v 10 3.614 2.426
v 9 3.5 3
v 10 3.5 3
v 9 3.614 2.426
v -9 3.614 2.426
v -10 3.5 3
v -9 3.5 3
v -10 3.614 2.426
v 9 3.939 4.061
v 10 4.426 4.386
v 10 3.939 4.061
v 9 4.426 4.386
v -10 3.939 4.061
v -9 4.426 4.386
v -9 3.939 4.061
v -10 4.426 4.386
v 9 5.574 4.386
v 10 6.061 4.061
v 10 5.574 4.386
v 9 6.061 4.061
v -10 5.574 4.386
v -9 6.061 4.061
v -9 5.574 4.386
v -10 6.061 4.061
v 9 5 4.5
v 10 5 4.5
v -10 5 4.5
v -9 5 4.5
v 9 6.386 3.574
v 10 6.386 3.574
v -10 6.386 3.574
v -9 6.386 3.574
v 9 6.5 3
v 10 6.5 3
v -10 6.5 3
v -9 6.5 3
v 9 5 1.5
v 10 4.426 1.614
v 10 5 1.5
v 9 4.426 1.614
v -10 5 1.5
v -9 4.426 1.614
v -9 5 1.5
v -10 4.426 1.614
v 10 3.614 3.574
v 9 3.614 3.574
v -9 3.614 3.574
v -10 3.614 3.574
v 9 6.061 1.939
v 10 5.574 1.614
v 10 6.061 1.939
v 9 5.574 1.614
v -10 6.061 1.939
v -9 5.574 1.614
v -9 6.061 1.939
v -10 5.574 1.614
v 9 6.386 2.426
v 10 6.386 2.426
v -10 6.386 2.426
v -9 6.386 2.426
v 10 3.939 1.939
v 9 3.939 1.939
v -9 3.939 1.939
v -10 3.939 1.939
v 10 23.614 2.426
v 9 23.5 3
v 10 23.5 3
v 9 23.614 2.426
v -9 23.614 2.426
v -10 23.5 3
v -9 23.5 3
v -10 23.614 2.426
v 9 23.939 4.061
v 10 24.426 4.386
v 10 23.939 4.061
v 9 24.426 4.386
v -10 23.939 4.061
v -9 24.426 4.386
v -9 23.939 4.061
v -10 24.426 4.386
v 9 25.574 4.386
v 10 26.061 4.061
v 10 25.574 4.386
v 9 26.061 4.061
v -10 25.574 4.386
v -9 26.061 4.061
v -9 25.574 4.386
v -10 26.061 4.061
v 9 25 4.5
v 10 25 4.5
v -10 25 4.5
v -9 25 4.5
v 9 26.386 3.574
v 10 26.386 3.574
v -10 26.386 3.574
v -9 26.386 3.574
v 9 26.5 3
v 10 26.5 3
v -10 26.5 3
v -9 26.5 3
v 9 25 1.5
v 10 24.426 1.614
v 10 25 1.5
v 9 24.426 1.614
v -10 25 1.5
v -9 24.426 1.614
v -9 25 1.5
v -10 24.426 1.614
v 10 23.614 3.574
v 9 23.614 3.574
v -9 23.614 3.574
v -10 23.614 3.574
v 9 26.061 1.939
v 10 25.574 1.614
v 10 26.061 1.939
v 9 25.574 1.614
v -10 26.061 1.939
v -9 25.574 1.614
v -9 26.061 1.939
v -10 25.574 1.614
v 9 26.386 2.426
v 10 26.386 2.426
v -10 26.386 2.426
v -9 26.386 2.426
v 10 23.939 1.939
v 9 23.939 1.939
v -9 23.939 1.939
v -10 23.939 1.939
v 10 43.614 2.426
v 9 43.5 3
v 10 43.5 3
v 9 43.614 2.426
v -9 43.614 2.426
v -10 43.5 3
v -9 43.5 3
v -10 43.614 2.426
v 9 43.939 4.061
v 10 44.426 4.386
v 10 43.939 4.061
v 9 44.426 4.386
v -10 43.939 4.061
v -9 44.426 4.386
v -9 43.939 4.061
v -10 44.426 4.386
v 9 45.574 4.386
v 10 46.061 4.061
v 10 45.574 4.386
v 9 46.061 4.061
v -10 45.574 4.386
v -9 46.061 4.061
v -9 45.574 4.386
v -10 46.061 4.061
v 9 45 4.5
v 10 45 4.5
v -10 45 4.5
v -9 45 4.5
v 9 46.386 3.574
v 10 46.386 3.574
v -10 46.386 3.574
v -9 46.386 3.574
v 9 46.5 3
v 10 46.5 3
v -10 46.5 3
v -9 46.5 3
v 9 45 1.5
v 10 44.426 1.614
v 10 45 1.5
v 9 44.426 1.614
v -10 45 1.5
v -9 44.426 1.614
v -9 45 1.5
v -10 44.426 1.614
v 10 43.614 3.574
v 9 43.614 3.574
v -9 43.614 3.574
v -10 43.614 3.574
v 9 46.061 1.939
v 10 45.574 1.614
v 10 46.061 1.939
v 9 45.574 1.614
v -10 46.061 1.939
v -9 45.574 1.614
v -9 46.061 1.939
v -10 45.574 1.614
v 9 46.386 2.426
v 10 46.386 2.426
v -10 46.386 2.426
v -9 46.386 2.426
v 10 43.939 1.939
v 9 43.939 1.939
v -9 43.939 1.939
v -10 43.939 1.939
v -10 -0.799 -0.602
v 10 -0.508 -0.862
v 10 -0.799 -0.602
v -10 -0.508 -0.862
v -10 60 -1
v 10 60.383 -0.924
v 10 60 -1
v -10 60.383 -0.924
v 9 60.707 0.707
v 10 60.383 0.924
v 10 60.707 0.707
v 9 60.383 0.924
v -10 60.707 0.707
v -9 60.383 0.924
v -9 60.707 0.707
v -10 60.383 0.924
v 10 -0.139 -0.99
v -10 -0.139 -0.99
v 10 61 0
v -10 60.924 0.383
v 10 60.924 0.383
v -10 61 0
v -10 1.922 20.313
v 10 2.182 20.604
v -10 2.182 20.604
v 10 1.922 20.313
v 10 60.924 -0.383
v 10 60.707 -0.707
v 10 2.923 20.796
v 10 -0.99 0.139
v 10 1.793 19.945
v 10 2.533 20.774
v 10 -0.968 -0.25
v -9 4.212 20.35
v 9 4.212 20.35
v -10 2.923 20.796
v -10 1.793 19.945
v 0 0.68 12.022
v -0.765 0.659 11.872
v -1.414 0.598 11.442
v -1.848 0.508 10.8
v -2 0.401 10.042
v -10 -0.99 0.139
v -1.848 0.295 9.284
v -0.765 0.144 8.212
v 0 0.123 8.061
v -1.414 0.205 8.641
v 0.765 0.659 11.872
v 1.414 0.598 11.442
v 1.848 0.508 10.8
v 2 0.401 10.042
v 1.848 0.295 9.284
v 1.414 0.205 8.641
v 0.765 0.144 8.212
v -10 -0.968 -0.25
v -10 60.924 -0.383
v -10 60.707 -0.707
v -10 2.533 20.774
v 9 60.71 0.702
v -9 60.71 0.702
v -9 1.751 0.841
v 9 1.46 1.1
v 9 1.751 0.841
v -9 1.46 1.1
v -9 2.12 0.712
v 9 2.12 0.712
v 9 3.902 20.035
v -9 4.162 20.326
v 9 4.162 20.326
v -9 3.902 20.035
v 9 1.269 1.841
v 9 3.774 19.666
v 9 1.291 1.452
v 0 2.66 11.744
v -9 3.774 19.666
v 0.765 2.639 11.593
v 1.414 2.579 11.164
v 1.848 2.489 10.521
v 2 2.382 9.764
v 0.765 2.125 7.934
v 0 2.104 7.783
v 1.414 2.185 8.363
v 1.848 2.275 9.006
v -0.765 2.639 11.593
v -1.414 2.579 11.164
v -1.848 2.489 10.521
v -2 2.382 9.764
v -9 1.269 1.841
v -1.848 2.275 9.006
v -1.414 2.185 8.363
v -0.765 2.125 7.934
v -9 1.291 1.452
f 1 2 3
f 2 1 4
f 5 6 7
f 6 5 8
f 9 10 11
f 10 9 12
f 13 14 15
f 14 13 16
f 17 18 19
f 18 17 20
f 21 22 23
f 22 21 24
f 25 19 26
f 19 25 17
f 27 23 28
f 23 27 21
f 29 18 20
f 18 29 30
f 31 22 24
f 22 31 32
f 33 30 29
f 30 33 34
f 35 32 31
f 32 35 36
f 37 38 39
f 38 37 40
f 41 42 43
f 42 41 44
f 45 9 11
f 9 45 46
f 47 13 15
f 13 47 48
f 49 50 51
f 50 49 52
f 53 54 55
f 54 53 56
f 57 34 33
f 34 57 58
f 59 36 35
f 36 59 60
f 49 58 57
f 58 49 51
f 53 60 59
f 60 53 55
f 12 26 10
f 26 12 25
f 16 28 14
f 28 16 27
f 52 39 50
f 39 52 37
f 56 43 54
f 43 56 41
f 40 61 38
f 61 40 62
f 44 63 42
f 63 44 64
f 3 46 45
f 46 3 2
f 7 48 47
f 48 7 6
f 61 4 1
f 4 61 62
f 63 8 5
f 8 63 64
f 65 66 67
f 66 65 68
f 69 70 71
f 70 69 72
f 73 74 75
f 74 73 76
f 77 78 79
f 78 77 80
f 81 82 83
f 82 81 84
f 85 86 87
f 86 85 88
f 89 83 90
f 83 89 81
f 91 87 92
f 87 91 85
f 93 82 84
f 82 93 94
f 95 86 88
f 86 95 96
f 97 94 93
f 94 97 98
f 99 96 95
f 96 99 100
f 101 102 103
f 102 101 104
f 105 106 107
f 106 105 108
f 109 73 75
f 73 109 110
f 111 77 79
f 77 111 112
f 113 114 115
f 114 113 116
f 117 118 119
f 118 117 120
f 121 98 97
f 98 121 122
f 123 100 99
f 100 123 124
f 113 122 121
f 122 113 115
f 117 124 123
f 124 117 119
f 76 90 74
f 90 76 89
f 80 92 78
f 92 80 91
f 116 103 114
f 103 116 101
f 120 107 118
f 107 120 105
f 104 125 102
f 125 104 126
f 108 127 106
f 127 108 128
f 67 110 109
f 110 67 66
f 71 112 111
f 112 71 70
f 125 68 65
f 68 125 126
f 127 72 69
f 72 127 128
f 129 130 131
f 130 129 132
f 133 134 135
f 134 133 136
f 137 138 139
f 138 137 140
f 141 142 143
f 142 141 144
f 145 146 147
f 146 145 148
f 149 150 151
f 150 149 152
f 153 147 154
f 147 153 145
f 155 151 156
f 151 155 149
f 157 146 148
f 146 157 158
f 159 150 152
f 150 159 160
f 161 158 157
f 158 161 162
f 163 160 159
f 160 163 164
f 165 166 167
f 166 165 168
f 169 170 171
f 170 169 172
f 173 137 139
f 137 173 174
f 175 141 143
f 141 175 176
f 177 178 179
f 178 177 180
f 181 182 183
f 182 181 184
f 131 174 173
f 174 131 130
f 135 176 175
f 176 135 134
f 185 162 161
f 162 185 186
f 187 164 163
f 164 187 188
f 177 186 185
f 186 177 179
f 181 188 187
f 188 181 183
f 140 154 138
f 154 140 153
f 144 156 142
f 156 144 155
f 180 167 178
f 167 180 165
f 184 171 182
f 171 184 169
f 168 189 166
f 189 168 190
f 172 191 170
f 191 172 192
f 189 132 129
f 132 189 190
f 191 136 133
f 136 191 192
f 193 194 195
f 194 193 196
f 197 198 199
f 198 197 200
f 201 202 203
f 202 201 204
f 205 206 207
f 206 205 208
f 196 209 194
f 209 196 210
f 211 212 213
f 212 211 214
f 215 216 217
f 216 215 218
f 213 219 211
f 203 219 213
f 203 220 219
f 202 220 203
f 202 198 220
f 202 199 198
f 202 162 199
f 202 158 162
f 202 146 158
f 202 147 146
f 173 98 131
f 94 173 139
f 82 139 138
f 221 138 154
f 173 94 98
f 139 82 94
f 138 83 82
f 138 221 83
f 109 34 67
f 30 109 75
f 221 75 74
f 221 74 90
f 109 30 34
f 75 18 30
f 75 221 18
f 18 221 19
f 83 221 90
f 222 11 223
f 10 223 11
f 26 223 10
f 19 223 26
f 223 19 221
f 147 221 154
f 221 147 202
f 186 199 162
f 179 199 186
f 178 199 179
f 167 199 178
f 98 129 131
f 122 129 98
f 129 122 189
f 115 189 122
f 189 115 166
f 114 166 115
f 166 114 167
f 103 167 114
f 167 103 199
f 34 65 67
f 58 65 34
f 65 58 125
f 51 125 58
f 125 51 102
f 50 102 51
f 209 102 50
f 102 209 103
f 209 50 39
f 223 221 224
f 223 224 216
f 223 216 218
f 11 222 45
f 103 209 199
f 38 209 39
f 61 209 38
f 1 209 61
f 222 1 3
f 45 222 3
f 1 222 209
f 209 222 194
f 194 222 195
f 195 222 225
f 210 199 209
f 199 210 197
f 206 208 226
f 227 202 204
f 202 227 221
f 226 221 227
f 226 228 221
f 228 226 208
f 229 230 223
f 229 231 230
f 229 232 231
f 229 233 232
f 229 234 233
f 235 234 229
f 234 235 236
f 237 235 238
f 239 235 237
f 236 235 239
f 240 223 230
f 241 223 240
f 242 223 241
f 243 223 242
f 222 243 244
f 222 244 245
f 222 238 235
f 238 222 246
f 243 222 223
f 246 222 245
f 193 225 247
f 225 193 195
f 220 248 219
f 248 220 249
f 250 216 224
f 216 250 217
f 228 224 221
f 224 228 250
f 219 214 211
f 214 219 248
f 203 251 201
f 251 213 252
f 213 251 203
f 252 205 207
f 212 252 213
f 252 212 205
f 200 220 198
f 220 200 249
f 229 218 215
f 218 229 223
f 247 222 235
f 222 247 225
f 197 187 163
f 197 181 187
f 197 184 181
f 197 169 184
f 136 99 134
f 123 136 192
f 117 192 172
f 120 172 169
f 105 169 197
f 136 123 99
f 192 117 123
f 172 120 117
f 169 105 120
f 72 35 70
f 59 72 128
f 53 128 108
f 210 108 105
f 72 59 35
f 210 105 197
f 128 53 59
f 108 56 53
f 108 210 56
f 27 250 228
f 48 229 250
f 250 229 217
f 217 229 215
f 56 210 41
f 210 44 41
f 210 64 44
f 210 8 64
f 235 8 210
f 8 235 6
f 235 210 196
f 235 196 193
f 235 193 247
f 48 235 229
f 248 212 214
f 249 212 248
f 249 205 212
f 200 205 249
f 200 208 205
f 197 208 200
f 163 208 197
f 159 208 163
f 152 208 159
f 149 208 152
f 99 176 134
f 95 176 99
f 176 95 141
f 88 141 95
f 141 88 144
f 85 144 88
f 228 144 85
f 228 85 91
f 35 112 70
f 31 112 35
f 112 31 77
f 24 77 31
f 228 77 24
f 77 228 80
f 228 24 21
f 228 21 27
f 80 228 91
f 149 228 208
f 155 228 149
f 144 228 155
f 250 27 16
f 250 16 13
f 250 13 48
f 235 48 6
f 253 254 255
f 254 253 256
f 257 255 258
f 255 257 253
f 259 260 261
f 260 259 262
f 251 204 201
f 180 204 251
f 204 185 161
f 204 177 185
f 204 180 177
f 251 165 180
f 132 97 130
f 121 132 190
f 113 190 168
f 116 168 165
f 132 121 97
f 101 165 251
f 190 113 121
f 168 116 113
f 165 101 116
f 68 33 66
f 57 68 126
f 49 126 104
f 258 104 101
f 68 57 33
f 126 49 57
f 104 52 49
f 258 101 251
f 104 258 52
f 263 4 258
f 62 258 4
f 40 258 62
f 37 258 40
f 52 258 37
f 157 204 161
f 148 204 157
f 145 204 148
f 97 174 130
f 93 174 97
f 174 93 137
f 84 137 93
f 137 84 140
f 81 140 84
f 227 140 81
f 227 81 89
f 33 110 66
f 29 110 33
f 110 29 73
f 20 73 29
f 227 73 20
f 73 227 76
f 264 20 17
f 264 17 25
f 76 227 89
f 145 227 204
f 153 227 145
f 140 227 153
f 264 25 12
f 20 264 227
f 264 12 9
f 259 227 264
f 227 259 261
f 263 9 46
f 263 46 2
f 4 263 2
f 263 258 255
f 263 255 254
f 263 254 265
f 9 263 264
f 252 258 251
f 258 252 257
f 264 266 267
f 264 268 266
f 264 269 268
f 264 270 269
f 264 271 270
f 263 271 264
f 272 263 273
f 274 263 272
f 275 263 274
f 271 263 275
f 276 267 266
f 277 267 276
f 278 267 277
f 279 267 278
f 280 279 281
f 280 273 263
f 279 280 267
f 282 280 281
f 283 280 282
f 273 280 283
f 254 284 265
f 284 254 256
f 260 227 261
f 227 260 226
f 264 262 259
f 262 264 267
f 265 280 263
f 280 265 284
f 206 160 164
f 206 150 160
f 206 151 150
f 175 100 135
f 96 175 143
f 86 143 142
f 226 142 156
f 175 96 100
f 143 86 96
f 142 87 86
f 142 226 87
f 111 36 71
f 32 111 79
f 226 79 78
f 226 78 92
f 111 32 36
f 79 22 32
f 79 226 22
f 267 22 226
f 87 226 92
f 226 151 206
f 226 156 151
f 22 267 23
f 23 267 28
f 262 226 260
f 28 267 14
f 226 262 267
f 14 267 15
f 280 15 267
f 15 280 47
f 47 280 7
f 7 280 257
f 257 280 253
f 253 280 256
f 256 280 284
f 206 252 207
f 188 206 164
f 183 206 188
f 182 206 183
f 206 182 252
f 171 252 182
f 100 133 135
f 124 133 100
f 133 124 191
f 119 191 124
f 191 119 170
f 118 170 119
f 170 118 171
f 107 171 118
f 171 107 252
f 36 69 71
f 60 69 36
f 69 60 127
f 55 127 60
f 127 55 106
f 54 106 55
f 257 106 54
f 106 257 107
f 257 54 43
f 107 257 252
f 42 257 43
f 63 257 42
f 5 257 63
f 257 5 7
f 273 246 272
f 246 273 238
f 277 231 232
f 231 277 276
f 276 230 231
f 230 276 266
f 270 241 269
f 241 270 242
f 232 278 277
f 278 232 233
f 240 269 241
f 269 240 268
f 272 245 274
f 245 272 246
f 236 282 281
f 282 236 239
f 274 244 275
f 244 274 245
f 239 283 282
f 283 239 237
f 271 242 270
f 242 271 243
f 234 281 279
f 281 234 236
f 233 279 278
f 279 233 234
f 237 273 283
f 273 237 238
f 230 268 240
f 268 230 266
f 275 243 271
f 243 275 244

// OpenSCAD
$fn = 16;

module TrianglePart(base, length, angle)
{
  linear_extrude(base, center=true)
  {
    hull()
    {
      circle(r=1);

      translate([base, 0, 0])
      {
        circle(r=1);
      }

      rotate([0, 0, -angle])
      {
        translate([0, length, 0])
        {
          circle(r=1);
        }
      }
    }
  }
}

module Thing(base, length, angle)
{
  difference()
  {
    TrianglePart(base, length, angle);

    translate([2, 2, 0])
    {
      TrianglePart(base - 2, length, angle);
    }

    translate([base / 2, 2, 0])
    {
      rotate([90, 0, 0])
      {
        cylinder(h=4, d=4);
      }
    }

    rotate([0, 0, -angle])
    {
      for(y = [5, 25, 45])
      {
        translate([3, y, 0])
        {
          cylinder(h=base+2, d=3, center=true);
        }
      }
    }
  }
}

rotate([0, -90, 0])
{
  rotate([0, 0, 8])
  {
    Thing(20, 60, 8);
  }
}
